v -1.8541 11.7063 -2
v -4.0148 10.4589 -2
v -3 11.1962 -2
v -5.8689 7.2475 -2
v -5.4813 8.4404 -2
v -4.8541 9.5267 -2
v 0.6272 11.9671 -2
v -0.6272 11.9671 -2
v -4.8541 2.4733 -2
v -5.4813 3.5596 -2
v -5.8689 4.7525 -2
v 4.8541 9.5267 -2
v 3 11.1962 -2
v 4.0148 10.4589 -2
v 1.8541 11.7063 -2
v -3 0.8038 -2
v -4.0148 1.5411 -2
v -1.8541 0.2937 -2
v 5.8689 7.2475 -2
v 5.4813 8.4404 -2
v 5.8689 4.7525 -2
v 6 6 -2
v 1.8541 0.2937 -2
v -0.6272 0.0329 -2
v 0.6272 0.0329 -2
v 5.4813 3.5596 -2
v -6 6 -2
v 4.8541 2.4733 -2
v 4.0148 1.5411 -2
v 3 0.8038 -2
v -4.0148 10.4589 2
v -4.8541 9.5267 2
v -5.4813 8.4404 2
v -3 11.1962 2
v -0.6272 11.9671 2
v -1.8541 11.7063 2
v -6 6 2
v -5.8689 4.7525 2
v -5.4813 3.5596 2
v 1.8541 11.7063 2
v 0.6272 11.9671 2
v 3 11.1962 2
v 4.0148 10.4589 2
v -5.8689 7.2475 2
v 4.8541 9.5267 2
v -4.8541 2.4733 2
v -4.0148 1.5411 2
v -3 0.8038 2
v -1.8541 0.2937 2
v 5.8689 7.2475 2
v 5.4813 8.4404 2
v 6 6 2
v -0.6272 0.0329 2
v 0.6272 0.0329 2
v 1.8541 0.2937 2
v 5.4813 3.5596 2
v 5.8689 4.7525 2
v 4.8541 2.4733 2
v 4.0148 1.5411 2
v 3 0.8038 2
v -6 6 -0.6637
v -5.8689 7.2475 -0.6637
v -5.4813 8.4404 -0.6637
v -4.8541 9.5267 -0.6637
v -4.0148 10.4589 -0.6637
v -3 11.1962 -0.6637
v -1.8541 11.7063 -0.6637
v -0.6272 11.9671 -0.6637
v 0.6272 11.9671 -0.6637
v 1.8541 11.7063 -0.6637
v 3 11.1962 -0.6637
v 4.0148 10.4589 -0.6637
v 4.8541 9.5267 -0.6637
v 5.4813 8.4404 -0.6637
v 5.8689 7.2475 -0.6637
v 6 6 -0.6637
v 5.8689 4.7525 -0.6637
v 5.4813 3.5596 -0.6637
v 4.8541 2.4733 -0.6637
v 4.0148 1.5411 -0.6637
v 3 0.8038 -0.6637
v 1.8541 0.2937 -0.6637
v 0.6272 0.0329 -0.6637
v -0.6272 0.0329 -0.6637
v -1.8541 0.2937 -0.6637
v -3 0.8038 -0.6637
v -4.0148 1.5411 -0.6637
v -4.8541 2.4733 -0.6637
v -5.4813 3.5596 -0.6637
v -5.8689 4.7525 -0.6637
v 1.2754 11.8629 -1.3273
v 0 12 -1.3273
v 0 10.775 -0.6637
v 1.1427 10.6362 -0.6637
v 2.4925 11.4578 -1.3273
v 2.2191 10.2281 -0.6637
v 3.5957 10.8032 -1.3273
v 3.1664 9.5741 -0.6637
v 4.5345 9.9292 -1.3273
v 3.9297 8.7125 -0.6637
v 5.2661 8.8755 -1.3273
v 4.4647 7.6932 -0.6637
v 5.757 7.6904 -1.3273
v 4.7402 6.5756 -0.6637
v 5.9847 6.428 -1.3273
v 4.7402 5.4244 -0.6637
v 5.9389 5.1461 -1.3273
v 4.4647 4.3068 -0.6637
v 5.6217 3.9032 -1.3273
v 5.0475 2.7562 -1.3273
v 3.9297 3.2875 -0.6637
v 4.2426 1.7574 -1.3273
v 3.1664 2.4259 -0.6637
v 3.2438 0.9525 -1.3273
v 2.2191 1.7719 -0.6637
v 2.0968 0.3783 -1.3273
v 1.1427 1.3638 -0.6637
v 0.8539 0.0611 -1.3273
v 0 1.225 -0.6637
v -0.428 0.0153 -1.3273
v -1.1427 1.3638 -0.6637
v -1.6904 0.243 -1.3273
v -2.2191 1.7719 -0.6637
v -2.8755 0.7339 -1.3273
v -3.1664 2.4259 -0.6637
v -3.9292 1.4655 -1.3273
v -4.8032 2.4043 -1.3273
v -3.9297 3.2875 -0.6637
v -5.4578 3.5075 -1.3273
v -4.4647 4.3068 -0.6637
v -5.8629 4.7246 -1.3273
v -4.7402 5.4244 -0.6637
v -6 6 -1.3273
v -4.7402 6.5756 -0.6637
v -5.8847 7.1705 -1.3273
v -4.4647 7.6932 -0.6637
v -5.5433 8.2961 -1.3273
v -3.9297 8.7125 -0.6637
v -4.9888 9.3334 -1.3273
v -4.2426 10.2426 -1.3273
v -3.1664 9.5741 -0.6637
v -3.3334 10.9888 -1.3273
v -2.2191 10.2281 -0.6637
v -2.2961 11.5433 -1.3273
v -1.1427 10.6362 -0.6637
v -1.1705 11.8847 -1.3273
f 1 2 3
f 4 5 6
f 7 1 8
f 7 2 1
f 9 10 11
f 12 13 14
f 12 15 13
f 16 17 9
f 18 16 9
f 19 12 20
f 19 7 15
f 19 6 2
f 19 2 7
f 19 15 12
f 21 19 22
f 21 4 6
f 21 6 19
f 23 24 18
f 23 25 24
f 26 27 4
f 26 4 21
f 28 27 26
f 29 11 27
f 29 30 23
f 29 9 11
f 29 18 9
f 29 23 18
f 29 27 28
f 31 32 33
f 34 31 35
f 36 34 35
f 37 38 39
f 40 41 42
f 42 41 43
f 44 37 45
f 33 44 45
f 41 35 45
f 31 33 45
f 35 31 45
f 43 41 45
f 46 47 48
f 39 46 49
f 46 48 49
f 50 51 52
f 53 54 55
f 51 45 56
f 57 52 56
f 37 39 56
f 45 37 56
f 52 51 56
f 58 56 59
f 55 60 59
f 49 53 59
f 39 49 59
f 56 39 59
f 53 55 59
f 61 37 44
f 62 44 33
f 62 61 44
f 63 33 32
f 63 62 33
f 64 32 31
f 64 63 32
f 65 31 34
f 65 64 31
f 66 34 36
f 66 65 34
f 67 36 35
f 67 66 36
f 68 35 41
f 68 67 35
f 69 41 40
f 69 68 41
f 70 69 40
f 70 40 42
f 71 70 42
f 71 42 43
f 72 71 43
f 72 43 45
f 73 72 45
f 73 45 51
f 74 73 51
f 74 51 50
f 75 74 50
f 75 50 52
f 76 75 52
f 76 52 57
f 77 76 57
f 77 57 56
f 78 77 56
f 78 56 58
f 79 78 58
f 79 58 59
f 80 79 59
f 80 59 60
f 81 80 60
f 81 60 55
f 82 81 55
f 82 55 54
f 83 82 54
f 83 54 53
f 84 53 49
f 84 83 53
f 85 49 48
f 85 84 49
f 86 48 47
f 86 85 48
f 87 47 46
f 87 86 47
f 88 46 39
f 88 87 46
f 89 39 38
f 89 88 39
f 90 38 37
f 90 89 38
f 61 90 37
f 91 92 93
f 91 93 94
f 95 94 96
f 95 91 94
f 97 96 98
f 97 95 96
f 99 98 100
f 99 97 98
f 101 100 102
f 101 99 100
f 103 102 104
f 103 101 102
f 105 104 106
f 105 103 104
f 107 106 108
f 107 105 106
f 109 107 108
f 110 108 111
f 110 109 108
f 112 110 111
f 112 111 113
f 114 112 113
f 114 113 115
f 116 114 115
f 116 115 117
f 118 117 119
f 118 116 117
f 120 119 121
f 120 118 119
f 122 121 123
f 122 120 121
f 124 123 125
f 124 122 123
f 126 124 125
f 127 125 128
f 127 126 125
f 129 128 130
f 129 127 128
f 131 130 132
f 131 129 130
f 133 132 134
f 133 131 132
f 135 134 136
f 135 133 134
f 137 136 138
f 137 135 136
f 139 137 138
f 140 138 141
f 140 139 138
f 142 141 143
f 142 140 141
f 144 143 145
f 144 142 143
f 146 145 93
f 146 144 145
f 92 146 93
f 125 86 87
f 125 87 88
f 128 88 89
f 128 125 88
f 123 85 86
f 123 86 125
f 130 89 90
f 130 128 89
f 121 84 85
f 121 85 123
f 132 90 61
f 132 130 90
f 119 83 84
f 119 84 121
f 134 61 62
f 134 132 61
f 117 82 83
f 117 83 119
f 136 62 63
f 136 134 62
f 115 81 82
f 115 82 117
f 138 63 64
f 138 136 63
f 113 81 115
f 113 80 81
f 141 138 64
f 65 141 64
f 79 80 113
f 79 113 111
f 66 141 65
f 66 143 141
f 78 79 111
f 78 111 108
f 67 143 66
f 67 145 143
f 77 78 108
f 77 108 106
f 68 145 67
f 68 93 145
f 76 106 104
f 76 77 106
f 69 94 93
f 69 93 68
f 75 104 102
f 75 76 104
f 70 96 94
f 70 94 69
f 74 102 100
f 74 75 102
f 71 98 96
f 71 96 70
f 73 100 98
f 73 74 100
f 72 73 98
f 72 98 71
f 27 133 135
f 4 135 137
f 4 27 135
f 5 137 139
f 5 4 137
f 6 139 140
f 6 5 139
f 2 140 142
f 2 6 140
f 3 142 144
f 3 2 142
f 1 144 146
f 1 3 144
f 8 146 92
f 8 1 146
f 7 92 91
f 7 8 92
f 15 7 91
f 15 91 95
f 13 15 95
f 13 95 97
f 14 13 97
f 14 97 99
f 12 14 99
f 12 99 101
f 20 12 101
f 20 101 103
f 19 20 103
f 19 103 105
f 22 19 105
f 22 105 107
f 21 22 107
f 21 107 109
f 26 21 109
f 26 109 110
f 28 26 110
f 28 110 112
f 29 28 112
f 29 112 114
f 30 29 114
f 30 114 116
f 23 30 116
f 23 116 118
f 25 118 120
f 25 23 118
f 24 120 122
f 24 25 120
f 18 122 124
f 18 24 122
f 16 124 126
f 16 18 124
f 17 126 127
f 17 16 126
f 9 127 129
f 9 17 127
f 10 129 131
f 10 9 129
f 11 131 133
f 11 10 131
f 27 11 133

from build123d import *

# Parameters (mm, degrees)
SKETCH1_W           = 12
SKETCH1_H           = 4
BOSS_EXTRUDE1_DEPTH = 12
SKETCH2_OUTSIDE_W   = 17.488
SKETCH2_OUTSIDE_H   = 17.488
SKETCH2_OUTSIDE_R   = 6
CUT_EXTRUDE1_DEPTH  = 12


with BuildPart() as part:
    # Sketch1 → Boss-Extrude1 (new body)
    with BuildSketch(Plane(origin=(0, 0, 0), x_dir=(1, 0, 0), z_dir=(0, 1, 0))):
        Rectangle(SKETCH1_W, SKETCH1_H)
    extrude(amount=BOSS_EXTRUDE1_DEPTH)

    # Sketch2 outside → Cut-Extrude1 (cut)
    with BuildSketch(Plane(origin=(0, 0, -2), x_dir=(-1, 0, 0), z_dir=(0, 0, -1))):
        with Locations((0, 6)):
            Rectangle(SKETCH2_OUTSIDE_W, SKETCH2_OUTSIDE_H)
        with Locations((0, 6)):
            Circle(SKETCH2_OUTSIDE_R, mode=Mode.SUBTRACT)
    extrude(amount=-CUT_EXTRUDE1_DEPTH, mode=Mode.SUBTRACT)

    # Sketch5 → Cut-Revolve1 (revolve, cut)
    with BuildSketch(Plane(origin=(0, 0, 0), x_dir=(0, 0, -1), z_dir=(1, 0, 0))):
        Polygon((0.663673358, 10.775), (1.327346716, 12), (0.663673358, 12), align=None)
    revolve(axis=Axis((0, 6, 0), (0, 0, -1)), mode=Mode.SUBTRACT)


solid = part.part
